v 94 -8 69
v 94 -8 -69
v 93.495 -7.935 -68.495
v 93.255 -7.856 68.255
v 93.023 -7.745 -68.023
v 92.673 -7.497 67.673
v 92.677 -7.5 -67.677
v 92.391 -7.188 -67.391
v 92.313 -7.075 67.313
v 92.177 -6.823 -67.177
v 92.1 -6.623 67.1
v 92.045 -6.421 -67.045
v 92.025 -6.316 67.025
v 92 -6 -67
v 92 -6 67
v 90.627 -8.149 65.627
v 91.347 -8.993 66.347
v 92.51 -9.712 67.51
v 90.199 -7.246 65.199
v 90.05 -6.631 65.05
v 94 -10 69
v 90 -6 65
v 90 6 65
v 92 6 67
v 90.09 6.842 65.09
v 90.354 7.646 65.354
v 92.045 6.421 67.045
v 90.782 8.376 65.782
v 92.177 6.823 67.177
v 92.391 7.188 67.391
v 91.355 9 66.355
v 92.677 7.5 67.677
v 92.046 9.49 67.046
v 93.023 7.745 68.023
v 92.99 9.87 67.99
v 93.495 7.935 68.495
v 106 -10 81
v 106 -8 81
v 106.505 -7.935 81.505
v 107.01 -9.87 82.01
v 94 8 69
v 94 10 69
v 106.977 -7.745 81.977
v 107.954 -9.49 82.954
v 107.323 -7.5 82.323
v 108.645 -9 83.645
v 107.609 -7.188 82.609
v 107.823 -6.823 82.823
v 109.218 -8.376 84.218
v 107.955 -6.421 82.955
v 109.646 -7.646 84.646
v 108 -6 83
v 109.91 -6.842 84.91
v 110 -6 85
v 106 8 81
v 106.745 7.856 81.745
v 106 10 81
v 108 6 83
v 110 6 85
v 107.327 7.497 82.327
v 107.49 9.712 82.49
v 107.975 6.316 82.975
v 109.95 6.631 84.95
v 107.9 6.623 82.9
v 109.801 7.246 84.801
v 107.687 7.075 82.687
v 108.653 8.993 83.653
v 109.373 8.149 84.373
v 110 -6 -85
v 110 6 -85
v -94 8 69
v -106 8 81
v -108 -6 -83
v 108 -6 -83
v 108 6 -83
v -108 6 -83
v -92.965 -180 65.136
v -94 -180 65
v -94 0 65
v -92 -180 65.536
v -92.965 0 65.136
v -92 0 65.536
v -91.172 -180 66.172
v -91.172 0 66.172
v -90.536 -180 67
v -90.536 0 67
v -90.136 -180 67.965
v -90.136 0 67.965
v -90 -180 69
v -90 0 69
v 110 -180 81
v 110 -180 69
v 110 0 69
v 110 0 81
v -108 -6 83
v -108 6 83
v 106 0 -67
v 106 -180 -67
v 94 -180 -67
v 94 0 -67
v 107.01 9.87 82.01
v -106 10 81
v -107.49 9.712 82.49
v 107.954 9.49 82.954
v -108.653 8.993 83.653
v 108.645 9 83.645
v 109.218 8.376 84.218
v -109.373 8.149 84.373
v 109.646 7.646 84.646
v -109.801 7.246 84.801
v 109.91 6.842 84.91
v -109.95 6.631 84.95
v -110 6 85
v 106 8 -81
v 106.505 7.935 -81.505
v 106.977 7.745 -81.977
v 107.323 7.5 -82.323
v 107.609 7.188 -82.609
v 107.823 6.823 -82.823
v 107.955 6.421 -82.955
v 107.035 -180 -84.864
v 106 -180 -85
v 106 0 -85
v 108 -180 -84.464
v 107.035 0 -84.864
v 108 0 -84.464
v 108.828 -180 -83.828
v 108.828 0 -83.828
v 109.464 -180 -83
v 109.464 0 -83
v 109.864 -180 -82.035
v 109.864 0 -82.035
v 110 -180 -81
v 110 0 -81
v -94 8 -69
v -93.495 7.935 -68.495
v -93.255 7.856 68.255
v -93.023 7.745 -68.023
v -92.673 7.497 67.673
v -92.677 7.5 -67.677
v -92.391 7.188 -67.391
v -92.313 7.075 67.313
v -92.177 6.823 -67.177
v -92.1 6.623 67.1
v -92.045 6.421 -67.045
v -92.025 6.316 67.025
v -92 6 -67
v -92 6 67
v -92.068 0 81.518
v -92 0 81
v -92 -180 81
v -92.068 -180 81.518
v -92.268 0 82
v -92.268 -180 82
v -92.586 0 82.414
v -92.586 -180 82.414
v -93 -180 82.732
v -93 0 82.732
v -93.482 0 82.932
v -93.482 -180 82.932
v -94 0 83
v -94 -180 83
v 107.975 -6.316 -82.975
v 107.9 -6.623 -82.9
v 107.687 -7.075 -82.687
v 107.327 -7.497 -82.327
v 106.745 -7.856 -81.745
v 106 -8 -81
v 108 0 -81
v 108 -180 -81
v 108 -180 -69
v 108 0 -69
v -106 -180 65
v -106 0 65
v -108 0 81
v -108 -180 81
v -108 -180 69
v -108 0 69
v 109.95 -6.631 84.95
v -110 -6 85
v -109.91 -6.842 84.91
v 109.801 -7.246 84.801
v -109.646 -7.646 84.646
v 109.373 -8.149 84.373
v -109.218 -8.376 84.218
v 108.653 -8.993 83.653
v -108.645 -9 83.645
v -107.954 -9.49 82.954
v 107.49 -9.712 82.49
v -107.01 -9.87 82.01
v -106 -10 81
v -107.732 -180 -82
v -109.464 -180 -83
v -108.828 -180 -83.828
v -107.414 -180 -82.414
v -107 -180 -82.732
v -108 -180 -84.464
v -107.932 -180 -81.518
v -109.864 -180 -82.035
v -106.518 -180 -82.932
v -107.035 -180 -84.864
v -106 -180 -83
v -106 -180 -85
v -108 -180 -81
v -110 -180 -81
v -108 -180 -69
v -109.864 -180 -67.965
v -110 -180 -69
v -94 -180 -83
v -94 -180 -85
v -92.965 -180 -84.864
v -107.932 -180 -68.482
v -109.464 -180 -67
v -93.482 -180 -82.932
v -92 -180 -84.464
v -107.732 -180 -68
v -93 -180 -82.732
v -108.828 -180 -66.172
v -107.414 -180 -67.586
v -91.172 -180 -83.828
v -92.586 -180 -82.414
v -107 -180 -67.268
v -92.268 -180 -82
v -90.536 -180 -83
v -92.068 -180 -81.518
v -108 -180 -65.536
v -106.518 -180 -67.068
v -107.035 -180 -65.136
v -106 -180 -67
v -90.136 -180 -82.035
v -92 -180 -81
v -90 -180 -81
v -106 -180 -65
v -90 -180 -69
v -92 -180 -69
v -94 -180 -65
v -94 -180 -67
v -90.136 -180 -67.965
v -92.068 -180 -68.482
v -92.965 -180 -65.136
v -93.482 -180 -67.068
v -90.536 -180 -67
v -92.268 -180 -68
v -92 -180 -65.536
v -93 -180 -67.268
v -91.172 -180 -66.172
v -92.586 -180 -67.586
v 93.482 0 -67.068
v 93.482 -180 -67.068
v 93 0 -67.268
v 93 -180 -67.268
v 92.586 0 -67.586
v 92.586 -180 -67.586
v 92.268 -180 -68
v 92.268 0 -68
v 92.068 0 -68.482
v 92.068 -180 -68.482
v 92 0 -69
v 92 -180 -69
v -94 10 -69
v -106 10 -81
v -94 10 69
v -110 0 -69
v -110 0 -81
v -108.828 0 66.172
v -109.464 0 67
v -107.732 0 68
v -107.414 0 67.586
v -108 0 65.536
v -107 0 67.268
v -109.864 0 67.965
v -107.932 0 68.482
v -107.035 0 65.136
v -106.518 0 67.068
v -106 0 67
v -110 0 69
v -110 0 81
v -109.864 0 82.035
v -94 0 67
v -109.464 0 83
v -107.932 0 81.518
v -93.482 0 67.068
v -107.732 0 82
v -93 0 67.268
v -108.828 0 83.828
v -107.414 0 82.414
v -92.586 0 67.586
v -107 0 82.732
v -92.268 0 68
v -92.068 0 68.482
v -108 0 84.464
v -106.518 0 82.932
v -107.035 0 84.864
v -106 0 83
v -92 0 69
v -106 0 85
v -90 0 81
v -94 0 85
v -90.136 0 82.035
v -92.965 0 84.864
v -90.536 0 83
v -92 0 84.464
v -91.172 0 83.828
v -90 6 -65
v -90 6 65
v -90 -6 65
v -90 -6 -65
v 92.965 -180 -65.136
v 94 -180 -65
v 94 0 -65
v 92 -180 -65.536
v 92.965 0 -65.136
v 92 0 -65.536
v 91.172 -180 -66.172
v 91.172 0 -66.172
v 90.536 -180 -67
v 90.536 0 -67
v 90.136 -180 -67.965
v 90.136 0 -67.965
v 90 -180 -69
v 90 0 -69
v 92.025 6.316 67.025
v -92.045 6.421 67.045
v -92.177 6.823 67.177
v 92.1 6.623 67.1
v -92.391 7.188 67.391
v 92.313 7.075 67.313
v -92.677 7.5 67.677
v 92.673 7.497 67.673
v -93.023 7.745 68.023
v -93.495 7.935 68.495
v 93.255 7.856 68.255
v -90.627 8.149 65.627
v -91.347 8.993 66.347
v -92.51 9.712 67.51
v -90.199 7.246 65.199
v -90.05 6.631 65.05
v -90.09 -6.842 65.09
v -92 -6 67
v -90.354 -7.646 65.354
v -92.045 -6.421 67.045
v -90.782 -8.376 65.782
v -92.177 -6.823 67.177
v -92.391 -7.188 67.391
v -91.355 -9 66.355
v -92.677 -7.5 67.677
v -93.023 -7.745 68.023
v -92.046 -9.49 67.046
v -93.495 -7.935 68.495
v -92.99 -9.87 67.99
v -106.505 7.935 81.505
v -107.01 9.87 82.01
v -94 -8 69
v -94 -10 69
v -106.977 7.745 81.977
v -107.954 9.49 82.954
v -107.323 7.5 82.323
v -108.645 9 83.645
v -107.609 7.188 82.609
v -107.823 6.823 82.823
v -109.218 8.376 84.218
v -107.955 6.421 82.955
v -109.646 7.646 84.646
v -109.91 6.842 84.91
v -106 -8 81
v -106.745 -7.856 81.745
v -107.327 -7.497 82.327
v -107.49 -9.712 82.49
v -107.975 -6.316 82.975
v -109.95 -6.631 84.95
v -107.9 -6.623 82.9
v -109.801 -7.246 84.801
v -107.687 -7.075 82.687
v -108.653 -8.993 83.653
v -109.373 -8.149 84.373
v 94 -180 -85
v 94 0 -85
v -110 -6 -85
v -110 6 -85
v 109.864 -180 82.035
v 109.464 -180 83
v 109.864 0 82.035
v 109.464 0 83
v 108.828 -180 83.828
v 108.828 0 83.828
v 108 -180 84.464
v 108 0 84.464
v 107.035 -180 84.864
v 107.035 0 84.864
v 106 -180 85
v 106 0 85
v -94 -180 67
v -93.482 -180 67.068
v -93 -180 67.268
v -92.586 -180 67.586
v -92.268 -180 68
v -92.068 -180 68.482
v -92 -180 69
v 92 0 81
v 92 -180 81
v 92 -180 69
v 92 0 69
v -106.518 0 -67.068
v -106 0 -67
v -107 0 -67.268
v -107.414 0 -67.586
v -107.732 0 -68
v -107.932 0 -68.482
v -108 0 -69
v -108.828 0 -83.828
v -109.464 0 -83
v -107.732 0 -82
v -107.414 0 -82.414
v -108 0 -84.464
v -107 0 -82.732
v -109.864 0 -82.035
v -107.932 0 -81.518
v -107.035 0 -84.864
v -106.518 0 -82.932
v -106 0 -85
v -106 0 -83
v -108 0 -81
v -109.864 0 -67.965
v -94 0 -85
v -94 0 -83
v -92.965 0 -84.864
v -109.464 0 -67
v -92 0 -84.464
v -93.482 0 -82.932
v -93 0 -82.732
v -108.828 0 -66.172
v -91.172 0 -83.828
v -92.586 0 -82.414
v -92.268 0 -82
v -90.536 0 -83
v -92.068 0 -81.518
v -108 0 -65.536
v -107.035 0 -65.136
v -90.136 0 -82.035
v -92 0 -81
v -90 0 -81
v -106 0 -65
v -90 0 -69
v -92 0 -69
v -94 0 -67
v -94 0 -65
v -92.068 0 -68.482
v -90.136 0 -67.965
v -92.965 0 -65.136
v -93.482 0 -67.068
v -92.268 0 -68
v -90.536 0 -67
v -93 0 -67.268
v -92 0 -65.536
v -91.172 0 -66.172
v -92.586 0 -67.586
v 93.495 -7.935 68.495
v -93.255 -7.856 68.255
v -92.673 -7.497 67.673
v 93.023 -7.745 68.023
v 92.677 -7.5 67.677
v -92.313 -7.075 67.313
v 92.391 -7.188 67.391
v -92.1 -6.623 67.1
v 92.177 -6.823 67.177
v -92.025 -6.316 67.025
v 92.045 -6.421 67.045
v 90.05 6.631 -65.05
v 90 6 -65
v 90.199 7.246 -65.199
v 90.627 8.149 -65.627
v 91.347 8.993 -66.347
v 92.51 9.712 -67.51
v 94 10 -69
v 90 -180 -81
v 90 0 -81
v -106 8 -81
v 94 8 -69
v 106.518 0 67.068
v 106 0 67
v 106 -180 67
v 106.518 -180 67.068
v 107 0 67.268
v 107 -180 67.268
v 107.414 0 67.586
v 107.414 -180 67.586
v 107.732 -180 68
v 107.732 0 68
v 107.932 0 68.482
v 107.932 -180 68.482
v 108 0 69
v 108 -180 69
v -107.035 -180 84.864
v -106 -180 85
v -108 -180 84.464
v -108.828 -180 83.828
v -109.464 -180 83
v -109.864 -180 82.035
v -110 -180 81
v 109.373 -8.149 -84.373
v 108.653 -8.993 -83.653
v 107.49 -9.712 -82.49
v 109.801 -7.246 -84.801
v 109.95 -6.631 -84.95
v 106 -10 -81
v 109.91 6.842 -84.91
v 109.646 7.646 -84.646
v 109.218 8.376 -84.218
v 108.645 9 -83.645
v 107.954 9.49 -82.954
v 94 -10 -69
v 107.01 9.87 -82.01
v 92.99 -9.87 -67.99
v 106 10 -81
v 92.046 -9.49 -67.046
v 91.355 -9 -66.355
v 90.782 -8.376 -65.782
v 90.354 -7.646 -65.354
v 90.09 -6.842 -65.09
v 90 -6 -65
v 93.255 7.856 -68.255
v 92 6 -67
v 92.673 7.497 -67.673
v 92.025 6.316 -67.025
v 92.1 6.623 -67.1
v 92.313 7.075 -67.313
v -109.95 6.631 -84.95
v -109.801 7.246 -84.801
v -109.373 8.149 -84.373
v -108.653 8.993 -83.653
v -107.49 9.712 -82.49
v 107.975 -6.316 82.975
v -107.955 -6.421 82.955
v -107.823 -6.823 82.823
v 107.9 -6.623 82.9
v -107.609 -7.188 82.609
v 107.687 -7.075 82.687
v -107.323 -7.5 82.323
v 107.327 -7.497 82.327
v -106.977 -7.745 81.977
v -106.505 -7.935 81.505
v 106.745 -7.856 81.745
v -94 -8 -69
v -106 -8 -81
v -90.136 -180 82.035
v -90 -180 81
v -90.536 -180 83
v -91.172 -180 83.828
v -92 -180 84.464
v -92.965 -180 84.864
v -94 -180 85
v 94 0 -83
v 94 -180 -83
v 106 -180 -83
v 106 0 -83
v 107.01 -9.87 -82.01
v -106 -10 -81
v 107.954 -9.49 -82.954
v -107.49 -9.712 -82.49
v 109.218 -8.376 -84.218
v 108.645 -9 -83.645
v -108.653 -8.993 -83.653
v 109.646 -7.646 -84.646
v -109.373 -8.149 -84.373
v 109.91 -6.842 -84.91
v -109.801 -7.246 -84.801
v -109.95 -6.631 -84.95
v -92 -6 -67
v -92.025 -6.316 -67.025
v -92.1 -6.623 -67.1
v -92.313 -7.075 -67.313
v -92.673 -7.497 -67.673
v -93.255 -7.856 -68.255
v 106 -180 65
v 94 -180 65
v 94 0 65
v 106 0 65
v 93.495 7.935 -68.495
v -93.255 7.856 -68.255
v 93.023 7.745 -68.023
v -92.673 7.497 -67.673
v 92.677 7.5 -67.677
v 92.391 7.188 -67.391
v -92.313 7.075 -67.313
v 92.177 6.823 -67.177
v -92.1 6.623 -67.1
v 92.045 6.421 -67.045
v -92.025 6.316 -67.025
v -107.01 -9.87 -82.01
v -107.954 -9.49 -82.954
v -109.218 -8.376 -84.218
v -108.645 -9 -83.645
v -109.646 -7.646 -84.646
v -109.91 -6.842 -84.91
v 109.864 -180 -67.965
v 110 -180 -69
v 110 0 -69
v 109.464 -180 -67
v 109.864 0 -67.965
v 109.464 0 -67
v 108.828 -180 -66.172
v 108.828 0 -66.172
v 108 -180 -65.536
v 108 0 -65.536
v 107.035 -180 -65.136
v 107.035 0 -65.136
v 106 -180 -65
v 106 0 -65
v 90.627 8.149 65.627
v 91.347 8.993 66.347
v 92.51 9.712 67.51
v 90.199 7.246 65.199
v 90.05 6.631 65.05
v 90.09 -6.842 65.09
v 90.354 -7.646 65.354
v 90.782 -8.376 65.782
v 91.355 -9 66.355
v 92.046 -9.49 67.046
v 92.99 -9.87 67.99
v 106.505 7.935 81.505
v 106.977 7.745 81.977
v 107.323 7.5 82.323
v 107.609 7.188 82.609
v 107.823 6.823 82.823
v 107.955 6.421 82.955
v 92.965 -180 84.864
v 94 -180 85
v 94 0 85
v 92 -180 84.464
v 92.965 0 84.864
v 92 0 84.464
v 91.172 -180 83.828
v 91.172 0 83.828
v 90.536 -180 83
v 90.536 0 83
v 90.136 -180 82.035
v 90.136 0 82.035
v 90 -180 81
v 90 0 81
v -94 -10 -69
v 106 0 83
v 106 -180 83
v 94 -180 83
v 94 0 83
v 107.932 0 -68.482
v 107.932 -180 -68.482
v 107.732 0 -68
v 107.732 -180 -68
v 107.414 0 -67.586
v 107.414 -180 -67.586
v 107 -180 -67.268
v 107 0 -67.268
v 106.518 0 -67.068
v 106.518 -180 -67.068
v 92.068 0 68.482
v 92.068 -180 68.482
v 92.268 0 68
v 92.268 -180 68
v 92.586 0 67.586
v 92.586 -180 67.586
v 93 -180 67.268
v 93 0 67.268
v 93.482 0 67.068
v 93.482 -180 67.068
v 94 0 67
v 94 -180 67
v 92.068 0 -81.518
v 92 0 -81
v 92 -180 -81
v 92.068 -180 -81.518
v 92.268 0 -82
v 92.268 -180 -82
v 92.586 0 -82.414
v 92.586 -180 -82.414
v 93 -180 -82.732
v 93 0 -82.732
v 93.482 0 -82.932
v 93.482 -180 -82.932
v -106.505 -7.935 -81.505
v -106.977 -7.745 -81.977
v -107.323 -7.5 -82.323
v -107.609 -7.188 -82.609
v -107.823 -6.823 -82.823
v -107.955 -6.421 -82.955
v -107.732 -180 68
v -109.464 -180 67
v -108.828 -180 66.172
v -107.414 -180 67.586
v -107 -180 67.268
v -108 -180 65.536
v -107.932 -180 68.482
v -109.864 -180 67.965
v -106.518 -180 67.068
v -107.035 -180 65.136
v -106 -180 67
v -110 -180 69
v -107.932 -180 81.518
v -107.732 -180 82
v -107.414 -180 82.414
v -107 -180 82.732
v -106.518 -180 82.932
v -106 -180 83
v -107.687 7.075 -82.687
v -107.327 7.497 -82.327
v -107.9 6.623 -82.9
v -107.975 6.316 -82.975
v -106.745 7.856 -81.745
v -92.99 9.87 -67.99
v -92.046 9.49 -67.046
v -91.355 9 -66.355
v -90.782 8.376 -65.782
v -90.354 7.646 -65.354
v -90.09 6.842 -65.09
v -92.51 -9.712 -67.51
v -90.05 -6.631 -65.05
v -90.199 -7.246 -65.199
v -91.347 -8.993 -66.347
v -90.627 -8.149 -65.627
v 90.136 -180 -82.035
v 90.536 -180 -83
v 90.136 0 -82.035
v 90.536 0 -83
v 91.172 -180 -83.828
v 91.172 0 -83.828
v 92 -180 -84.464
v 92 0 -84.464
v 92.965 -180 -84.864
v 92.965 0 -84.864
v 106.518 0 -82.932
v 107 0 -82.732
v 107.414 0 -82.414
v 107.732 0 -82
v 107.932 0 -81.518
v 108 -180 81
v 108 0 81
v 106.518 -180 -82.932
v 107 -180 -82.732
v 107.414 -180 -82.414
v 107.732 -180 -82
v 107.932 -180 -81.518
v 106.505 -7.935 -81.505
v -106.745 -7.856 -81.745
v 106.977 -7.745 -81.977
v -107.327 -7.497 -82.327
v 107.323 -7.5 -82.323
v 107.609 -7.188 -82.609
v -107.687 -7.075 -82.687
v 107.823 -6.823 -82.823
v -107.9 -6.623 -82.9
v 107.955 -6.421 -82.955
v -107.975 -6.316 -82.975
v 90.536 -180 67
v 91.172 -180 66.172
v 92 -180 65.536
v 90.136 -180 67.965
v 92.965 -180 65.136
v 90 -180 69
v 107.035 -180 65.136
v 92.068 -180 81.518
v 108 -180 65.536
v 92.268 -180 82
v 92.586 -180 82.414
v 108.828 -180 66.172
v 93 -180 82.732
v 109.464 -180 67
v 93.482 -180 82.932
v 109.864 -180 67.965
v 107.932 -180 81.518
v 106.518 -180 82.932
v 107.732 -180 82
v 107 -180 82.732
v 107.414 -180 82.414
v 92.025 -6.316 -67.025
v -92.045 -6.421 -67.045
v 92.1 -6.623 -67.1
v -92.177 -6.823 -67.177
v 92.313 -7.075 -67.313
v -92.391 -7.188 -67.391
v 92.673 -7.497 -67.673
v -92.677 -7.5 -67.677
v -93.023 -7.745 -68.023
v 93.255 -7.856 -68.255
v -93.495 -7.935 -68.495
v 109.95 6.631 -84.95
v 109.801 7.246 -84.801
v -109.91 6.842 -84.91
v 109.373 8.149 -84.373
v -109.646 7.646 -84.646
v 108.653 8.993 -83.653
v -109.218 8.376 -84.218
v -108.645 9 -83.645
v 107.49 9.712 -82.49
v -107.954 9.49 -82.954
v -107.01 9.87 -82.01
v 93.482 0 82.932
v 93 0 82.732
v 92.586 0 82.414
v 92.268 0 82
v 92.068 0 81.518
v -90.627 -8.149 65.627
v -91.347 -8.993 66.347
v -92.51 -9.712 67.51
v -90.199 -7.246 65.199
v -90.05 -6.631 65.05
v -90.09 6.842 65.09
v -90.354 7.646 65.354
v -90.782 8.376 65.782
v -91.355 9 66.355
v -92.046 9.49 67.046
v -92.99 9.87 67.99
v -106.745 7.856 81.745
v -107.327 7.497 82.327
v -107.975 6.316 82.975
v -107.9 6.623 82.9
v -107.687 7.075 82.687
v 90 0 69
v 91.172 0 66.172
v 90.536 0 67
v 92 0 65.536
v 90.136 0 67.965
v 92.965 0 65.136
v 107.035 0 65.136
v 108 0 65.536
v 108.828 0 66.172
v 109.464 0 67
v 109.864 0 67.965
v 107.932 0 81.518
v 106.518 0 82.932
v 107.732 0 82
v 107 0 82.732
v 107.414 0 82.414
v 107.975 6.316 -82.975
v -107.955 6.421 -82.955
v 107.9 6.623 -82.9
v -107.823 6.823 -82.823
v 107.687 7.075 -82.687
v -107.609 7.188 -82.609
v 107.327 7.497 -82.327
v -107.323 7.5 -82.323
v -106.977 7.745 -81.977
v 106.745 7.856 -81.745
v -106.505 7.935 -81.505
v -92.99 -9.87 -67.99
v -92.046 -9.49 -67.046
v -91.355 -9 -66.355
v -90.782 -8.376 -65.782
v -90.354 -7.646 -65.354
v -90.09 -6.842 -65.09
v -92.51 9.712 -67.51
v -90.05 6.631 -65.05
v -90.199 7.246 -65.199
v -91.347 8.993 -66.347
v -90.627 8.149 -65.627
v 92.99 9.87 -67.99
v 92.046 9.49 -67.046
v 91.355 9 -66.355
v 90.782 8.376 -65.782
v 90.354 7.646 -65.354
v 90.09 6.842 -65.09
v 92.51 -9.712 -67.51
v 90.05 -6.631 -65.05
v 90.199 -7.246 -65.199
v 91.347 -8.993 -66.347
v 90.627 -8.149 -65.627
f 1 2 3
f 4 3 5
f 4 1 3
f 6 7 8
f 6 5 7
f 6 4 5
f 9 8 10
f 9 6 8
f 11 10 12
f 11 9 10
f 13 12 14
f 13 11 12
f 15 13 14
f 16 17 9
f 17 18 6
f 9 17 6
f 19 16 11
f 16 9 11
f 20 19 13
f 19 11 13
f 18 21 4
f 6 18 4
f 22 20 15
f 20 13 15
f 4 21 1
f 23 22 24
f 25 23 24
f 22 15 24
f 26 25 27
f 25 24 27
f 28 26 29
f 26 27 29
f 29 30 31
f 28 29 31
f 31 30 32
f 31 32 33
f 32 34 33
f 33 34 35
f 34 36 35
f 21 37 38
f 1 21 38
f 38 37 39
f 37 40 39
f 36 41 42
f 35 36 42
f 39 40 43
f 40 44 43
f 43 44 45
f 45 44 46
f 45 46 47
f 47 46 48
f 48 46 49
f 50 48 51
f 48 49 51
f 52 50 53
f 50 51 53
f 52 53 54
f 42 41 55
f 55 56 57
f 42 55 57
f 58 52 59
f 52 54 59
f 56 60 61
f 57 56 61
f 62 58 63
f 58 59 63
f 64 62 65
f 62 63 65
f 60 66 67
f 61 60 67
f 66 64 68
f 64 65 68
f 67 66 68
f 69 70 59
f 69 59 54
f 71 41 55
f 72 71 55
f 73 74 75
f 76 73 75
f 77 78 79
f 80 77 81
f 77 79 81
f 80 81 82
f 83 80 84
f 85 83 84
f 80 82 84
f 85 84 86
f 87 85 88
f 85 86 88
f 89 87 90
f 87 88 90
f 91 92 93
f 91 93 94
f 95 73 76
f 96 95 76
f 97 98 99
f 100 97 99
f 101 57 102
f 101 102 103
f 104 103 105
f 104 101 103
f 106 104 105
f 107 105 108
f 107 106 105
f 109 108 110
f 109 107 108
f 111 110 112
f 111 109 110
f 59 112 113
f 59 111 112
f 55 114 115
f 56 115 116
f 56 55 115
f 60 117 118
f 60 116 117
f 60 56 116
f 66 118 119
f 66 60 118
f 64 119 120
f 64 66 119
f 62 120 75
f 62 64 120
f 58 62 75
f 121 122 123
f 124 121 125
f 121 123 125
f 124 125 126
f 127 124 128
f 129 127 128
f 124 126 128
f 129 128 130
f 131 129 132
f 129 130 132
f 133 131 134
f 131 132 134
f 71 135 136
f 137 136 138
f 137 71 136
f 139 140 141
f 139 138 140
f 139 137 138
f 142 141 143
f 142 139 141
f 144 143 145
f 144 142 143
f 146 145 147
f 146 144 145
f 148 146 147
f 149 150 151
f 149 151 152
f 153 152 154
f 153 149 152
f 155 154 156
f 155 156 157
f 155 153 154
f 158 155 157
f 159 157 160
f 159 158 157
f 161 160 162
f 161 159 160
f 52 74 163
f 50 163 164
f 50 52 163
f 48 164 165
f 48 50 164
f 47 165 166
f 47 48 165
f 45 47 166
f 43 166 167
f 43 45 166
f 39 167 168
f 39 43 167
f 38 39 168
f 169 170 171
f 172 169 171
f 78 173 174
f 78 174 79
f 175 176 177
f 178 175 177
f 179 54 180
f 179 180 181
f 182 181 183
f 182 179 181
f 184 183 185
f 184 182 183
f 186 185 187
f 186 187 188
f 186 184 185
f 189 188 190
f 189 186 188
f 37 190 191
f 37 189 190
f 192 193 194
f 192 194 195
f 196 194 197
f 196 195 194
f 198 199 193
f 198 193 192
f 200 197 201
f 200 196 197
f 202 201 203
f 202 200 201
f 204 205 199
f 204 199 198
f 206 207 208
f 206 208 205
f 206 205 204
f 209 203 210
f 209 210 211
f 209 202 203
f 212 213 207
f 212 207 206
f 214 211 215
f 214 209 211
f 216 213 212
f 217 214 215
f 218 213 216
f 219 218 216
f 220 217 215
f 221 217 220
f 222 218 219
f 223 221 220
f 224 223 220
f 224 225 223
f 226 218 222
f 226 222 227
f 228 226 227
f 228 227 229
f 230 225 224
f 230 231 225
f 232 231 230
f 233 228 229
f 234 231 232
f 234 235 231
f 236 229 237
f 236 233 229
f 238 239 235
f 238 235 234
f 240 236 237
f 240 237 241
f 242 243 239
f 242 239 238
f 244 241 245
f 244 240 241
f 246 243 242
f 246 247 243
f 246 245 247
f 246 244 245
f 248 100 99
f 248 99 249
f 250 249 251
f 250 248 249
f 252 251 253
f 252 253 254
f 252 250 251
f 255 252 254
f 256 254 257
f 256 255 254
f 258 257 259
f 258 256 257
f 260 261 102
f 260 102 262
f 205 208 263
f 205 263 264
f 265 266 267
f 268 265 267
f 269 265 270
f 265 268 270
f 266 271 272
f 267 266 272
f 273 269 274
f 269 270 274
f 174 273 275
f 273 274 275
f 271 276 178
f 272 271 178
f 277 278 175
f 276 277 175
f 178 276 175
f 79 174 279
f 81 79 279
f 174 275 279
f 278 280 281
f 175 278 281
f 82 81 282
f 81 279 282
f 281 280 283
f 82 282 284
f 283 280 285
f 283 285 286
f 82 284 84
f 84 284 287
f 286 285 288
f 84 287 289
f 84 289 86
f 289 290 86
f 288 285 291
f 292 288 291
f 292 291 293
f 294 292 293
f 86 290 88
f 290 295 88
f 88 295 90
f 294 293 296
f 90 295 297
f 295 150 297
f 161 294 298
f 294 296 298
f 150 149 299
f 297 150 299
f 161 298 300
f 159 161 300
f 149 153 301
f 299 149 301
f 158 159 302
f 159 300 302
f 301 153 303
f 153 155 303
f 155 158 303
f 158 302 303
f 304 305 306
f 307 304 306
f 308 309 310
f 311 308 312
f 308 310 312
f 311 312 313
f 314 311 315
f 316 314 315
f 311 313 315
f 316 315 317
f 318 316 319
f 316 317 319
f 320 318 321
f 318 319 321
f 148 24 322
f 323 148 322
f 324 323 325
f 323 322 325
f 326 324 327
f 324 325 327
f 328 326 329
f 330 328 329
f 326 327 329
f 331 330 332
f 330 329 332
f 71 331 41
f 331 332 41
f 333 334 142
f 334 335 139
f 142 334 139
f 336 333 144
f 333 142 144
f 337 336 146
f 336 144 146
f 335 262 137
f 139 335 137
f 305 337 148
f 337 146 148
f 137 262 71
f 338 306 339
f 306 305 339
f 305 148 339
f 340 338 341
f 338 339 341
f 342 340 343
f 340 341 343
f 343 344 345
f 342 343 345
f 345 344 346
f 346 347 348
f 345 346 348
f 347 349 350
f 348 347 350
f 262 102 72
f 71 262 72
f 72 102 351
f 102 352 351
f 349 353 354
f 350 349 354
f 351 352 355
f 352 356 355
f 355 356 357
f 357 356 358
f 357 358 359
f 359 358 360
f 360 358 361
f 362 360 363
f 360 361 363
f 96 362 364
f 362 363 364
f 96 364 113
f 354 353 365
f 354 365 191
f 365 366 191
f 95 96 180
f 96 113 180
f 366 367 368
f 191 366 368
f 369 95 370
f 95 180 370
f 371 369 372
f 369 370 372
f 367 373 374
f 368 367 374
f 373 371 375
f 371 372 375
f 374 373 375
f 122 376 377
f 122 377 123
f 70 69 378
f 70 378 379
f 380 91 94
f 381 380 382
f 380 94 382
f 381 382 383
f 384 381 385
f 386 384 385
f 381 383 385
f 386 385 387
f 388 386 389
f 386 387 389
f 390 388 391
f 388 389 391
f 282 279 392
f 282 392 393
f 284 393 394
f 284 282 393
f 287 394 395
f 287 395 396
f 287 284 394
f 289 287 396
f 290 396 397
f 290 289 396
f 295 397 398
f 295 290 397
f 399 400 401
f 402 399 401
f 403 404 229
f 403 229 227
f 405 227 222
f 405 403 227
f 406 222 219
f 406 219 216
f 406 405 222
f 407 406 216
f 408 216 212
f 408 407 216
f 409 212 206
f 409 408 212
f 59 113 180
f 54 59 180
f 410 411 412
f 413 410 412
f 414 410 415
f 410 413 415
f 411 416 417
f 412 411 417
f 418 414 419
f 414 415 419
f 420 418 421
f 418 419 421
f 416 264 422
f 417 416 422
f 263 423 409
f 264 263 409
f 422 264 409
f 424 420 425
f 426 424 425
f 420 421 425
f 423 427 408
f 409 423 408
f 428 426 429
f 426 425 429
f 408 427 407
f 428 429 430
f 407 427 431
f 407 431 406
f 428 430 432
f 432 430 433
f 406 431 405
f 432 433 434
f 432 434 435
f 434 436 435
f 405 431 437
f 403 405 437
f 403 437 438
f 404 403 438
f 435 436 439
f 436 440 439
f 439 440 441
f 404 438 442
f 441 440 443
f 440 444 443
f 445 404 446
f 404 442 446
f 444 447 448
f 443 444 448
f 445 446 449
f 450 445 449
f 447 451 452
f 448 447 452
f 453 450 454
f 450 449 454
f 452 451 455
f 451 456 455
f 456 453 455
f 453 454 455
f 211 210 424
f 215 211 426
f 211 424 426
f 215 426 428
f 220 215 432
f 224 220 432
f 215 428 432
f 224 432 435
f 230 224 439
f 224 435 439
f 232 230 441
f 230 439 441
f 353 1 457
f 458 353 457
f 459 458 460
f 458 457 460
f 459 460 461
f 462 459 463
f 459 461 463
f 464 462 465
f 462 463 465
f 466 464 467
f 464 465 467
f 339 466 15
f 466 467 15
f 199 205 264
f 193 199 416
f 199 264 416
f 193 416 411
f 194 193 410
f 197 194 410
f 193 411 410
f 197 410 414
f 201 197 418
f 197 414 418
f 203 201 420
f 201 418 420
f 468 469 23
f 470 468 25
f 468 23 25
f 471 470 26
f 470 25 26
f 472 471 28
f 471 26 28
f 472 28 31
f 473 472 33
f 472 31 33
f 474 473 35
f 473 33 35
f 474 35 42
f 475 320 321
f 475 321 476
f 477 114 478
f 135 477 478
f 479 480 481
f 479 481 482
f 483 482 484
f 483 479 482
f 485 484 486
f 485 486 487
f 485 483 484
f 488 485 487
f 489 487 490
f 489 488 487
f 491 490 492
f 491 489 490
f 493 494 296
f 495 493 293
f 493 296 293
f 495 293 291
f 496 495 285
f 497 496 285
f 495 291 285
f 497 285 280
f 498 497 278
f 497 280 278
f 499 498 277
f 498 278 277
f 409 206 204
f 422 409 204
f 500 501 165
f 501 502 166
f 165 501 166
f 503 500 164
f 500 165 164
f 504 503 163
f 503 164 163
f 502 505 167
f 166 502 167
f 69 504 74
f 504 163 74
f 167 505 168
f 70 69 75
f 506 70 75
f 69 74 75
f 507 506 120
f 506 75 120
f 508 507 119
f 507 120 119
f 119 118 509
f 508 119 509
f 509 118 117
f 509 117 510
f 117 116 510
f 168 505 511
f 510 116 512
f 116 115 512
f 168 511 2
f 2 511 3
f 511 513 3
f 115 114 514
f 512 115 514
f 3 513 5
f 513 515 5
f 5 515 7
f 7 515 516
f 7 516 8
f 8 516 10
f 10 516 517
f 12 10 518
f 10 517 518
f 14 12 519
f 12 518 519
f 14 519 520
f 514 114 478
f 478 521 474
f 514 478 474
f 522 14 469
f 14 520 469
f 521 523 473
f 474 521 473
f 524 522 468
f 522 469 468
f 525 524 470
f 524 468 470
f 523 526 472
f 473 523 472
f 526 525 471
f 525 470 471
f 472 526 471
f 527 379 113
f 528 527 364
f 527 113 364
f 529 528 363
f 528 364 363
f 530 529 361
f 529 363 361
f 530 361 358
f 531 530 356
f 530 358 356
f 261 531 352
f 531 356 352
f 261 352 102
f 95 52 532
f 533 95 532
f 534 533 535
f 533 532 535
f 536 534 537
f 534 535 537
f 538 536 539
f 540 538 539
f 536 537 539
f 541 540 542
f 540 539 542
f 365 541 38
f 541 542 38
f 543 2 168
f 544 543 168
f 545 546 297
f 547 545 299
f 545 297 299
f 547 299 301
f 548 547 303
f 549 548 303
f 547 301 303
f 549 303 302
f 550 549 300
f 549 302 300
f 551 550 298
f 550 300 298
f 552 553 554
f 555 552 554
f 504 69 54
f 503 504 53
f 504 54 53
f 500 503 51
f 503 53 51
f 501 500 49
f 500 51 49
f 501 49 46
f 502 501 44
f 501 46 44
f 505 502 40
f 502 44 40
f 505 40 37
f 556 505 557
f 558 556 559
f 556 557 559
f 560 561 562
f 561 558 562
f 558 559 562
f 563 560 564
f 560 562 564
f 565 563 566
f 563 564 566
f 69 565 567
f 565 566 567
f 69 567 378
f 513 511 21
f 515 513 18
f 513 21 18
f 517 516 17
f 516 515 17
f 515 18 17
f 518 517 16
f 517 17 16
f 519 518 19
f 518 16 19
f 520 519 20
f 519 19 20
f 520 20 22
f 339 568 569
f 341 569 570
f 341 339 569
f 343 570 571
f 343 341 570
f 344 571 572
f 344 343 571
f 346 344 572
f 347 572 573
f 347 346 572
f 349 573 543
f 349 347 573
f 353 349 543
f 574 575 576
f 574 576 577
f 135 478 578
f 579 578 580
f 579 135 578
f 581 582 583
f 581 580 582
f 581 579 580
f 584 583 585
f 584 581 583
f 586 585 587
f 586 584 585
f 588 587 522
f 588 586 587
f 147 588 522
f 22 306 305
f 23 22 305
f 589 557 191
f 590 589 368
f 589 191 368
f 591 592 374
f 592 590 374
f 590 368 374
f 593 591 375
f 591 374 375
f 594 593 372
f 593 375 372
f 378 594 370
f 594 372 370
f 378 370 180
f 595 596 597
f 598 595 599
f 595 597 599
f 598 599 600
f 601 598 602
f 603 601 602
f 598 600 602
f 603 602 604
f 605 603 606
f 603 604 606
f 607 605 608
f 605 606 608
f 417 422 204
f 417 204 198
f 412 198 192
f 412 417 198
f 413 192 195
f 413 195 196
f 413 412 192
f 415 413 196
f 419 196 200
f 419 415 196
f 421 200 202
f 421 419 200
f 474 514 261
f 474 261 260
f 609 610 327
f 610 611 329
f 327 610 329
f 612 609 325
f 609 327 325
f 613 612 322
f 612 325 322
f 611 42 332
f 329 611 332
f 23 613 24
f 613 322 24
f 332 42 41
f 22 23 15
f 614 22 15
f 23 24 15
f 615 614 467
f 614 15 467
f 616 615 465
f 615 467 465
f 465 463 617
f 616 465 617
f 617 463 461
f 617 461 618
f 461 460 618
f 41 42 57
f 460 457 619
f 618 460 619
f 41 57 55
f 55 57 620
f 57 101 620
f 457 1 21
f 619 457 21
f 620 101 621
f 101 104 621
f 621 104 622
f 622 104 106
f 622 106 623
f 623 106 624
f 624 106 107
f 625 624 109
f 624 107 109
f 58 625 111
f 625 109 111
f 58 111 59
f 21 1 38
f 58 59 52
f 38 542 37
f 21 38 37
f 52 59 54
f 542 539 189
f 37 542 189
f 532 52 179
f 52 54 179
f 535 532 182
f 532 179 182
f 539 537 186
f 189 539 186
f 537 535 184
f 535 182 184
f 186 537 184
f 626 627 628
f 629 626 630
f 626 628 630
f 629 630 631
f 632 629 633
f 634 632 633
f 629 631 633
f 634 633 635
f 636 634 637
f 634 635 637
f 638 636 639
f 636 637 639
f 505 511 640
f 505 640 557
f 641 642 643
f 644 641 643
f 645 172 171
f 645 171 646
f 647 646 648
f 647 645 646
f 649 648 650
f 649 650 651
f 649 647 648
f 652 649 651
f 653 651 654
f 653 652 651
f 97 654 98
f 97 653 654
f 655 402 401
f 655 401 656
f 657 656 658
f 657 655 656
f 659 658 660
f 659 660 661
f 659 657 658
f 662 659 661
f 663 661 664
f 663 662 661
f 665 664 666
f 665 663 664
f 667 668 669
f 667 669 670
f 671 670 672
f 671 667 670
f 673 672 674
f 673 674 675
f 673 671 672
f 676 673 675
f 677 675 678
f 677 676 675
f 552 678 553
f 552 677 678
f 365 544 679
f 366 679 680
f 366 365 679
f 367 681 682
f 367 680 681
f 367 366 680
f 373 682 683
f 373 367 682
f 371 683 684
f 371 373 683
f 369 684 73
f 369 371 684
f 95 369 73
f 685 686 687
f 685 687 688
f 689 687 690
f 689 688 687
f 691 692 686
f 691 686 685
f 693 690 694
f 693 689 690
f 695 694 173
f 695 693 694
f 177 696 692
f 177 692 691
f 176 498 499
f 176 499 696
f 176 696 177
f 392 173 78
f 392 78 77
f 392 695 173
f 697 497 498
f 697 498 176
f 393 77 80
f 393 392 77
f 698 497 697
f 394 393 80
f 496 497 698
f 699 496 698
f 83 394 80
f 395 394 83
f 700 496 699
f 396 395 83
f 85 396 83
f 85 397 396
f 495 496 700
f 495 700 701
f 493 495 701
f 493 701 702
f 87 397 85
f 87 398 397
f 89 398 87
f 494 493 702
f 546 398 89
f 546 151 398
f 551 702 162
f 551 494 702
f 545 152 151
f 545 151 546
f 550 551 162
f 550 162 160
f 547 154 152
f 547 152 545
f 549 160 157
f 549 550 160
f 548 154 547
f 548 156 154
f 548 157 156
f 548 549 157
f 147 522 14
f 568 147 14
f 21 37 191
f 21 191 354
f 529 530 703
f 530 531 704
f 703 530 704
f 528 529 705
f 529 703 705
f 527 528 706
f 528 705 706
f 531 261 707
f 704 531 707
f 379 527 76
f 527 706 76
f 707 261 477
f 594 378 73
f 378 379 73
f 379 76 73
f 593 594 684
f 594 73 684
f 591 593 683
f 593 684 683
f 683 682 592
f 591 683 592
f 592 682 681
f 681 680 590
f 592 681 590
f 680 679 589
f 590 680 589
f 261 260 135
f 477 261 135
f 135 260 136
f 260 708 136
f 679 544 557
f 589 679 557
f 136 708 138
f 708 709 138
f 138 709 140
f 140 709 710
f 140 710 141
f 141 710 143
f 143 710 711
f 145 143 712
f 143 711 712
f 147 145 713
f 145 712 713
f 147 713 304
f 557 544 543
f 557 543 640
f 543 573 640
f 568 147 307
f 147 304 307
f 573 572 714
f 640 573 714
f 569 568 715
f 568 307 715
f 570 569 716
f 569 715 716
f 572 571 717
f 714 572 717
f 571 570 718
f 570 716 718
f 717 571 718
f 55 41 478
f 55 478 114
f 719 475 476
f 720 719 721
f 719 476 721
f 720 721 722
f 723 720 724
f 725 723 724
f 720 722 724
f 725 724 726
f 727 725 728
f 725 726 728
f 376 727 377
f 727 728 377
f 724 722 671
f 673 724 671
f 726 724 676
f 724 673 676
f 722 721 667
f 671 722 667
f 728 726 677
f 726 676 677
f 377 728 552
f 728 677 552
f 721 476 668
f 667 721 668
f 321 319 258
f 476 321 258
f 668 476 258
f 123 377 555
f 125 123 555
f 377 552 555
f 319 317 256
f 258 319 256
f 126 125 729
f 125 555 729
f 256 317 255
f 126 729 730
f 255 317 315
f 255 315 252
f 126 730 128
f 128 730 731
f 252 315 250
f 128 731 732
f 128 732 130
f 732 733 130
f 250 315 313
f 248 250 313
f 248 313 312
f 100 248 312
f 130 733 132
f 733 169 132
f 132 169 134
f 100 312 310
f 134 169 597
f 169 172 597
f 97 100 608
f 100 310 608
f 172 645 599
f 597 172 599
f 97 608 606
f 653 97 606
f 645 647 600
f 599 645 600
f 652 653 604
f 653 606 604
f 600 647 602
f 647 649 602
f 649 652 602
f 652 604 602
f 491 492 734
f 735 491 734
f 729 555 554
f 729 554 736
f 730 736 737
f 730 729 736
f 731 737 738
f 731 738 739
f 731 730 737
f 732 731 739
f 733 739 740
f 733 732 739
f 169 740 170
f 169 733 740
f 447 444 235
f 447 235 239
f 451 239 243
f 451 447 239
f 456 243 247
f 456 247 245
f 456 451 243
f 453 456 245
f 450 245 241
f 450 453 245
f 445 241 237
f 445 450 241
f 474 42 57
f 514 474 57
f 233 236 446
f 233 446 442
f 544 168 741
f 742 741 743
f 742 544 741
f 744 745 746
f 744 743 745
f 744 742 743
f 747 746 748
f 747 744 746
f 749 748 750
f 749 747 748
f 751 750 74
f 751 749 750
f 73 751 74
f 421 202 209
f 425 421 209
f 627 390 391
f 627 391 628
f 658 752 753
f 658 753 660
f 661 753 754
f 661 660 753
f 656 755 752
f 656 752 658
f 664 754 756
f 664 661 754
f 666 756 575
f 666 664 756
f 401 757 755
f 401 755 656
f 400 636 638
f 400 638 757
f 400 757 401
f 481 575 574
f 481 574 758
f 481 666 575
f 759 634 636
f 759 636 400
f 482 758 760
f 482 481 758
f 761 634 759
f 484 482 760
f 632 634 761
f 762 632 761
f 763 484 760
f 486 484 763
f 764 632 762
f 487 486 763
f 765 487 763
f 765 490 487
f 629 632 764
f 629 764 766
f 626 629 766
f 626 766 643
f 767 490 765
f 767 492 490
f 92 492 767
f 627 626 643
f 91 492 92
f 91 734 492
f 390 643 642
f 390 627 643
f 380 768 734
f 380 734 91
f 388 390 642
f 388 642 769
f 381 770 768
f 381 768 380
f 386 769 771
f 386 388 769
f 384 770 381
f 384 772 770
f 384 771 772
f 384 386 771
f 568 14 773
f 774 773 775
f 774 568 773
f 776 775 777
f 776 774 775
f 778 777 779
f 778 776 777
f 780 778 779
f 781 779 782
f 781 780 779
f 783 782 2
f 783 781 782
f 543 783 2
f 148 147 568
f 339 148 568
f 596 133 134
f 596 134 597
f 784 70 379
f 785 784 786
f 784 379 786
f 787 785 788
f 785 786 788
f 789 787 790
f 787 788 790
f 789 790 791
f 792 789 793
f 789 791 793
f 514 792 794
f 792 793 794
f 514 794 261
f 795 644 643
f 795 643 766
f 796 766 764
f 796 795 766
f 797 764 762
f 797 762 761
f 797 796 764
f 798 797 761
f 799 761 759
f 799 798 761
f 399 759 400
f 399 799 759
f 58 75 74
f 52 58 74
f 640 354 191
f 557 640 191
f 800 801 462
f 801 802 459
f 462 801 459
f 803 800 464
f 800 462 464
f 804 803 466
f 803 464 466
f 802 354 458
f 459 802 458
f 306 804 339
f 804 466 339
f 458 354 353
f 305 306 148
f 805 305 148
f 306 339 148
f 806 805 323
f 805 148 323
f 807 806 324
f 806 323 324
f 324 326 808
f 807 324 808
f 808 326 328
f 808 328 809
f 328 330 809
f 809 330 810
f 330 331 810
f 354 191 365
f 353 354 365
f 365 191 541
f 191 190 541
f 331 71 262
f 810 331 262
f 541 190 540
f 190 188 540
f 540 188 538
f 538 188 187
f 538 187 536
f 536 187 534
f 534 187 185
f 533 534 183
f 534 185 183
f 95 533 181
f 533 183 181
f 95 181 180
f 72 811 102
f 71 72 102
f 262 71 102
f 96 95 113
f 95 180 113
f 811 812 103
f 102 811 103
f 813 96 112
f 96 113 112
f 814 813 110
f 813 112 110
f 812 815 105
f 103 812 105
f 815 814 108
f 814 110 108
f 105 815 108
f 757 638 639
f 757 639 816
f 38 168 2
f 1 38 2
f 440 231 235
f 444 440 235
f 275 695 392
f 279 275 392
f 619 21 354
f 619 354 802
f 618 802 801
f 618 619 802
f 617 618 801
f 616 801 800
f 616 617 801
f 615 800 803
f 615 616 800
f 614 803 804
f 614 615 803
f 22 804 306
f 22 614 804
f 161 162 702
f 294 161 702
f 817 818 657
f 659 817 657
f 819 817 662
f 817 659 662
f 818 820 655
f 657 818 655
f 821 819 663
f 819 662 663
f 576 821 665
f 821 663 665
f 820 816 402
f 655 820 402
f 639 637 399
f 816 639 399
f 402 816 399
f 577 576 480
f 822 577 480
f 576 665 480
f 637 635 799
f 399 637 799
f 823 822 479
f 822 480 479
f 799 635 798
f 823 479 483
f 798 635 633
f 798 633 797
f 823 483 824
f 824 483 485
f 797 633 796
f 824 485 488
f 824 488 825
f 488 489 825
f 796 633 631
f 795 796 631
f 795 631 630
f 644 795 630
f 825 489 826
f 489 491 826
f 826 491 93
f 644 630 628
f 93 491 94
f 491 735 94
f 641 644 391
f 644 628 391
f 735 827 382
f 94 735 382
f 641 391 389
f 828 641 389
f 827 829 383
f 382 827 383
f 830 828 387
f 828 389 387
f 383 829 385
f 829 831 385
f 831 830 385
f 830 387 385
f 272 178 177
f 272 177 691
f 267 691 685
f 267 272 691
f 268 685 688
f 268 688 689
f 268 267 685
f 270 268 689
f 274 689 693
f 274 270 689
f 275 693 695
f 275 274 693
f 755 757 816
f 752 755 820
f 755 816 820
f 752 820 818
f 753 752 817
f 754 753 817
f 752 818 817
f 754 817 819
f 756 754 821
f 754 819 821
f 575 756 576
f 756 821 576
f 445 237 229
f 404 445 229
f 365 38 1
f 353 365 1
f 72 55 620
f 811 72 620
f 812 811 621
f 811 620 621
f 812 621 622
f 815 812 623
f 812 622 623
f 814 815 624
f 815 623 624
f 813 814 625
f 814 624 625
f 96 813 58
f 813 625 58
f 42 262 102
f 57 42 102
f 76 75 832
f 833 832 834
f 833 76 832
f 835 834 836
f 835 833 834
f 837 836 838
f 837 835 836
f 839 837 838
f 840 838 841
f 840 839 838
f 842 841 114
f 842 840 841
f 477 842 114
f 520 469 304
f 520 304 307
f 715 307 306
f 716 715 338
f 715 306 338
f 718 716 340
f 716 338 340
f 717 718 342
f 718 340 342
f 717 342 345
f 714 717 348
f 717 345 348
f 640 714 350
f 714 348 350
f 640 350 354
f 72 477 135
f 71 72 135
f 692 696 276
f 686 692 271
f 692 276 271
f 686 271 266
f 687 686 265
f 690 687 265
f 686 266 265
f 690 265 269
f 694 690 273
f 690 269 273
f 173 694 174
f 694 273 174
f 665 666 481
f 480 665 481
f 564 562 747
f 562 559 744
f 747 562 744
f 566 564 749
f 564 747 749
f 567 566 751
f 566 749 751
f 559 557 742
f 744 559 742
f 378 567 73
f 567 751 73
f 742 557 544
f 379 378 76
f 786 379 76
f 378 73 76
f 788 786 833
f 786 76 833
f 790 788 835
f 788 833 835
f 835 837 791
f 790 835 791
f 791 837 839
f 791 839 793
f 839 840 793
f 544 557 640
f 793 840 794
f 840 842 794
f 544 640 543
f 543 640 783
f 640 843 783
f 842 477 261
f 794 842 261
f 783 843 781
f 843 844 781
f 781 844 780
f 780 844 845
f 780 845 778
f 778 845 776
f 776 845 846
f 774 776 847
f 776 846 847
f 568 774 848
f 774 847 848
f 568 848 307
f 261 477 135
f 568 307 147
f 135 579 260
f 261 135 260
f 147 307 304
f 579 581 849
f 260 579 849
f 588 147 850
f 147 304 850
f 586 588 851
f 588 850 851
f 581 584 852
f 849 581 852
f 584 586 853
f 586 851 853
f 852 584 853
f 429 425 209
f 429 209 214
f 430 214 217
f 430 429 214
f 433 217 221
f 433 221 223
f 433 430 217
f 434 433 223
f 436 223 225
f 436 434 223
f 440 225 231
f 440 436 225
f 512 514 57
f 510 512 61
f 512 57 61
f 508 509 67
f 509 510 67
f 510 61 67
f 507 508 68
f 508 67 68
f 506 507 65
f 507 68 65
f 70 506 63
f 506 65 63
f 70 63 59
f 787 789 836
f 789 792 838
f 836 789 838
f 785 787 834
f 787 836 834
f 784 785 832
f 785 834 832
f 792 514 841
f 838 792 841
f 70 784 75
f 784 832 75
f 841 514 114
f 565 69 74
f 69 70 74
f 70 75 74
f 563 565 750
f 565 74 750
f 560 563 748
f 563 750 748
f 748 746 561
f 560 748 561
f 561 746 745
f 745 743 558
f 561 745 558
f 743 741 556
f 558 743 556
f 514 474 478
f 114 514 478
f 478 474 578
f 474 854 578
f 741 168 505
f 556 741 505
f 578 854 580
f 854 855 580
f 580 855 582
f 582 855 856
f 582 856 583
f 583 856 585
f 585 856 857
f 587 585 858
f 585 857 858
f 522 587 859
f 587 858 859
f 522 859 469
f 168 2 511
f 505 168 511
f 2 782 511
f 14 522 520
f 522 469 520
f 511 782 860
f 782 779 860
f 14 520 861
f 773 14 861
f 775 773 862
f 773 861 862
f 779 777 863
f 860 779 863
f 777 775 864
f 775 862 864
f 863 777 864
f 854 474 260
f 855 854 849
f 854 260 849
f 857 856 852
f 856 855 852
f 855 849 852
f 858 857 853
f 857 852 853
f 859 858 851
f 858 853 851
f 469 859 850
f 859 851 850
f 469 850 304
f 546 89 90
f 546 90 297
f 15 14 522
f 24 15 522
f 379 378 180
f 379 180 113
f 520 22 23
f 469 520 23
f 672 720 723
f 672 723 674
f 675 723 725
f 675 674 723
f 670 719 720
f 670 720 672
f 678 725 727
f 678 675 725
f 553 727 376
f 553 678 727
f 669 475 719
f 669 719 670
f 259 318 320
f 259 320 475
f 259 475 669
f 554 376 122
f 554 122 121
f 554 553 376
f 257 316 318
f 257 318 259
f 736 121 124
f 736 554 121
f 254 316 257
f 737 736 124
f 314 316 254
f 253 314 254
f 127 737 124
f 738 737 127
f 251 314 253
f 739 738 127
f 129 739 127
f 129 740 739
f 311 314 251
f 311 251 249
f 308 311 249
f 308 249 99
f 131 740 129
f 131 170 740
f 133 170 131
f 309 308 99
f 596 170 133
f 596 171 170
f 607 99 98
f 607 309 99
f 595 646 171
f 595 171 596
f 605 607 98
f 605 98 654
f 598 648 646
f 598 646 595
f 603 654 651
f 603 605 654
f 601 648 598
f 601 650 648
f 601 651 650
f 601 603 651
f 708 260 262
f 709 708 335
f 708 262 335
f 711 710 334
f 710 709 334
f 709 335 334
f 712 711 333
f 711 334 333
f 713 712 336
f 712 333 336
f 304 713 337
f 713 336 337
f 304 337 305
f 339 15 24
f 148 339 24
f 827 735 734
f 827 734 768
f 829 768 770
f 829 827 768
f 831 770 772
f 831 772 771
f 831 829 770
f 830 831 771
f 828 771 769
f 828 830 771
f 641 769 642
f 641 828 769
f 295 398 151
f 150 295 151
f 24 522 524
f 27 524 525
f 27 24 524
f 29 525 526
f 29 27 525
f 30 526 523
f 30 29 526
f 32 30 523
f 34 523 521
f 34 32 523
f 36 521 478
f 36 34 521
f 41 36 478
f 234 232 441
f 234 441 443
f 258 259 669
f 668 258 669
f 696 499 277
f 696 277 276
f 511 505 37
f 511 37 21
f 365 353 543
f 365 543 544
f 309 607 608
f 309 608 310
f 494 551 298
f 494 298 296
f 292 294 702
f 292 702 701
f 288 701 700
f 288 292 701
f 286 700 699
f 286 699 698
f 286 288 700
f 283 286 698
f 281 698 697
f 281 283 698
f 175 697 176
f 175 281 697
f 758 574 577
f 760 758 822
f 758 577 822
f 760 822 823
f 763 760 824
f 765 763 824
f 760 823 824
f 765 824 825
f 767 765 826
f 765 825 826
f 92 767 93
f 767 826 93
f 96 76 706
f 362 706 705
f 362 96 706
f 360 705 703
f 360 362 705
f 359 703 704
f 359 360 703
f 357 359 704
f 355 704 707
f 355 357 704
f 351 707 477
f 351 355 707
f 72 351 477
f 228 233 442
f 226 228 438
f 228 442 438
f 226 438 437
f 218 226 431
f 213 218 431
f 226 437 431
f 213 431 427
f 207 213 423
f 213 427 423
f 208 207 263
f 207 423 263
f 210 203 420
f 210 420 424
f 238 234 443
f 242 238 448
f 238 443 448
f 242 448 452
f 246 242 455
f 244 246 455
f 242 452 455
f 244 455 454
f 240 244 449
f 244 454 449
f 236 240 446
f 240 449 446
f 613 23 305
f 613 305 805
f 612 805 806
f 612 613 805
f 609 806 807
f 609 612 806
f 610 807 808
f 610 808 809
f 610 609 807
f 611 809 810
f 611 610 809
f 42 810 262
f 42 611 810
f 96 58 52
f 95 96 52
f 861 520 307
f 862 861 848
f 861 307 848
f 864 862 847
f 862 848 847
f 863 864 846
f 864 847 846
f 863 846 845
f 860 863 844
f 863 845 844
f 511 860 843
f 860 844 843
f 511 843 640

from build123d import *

# Parameters (mm, degrees)
STRUCTURAL_MEMBER1_DEPTH      = 215.142135624
STRUCTURAL_MEMBER1_DEPTH_BACK = 15.142135624
STRUCTURAL_MEMBER1_2_DEPTH    = 180.284271247
STRUCTURAL_MEMBER1_3_DEPTH    = 230.284271247
STRUCTURAL_MEMBER1_4_DEPTH    = 180.284271247
STRUCTURAL_MEMBER2_DEPTH      = 180
STRUCTURAL_MEMBER2_2_DEPTH    = 180
STRUCTURAL_MEMBER2_3_DEPTH    = 180
STRUCTURAL_MEMBER2_4_DEPTH    = 180


with BuildPart() as part:
    # Sketch1 → Structural Member1 (new body, two sides)
    with BuildSketch(Plane(origin=(-100, 0, 75), x_dir=(0, 0, -1), z_dir=(1, 0, 0))) as structural_member1_sk:
        with BuildLine():
            Line((-6, -10), (6, -10))
            ThreePointArc((6, -10), (8.828427125, -8.828427125), (10, -6))
            Line((10, -6), (10, 6))
            ThreePointArc((10, 6), (8.828427125, 8.828427125), (6, 10))
            Line((6, 10), (-6, 10))
            ThreePointArc((-6, 10), (-8.828427125, 8.828427125), (-10, 6))
            Line((-10, 6), (-10, -6))
            ThreePointArc((-10, -6), (-8.828427125, -8.828427125), (-6, -10))
        make_face()
        with BuildLine():
            Line((-6, -8), (6, -8))
            ThreePointArc((6, -8), (7.414213562, -7.414213562), (8, -6))
            Line((8, -6), (8, 6))
            ThreePointArc((8, 6), (7.414213562, 7.414213562), (6, 8))
            Line((6, 8), (-6, 8))
            ThreePointArc((-6, 8), (-7.414213562, 7.414213562), (-8, 6))
            Line((-8, 6), (-8, -6))
            ThreePointArc((-8, -6), (-7.414213562, -7.414213562), (-6, -8))
        make_face(mode=Mode.SUBTRACT)
    extrude(amount=STRUCTURAL_MEMBER1_DEPTH)
    extrude(structural_member1_sk.sketch, amount=-STRUCTURAL_MEMBER1_DEPTH_BACK)

    # Structural Member1 mitre 1
    split(bisect_by=Plane(origin=(-100, 0, 75), x_dir=(0, 1, 0), z_dir=(0.707106781, 0, 0.707106781)), keep=Keep.TOP)

    # Structural Member1 mitre 2
    split(bisect_by=Plane(origin=(100, 0, 75), x_dir=(0, -1, 0), z_dir=(-0.707106781, 0, 0.707106781)), keep=Keep.TOP)


with BuildPart() as body_2:
    # Sketch1 on segment 2 (carried to segment 2) → Structural Member1 2 (new body)
    with BuildSketch(Plane(origin=(100, 0, 90.142135624), x_dir=(-1, 0, 0), z_dir=(0, 0, -1))):
        with BuildLine():
            Line((-6, -10), (6, -10))
            ThreePointArc((6, -10), (8.828427125, -8.828427125), (10, -6))
            Line((10, -6), (10, 6))
            ThreePointArc((10, 6), (8.828427125, 8.828427125), (6, 10))
            Line((6, 10), (-6, 10))
            ThreePointArc((-6, 10), (-8.828427125, 8.828427125), (-10, 6))
            Line((-10, 6), (-10, -6))
            ThreePointArc((-10, -6), (-8.828427125, -8.828427125), (-6, -10))
        make_face()
        with BuildLine():
            Line((-6, -8), (6, -8))
            ThreePointArc((6, -8), (7.414213562, -7.414213562), (8, -6))
            Line((8, -6), (8, 6))
            ThreePointArc((8, 6), (7.414213562, 7.414213562), (6, 8))
            Line((6, 8), (-6, 8))
            ThreePointArc((-6, 8), (-7.414213562, 7.414213562), (-8, 6))
            Line((-8, 6), (-8, -6))
            ThreePointArc((-8, -6), (-7.414213562, -7.414213562), (-6, -8))
        make_face(mode=Mode.SUBTRACT)
    extrude(amount=STRUCTURAL_MEMBER1_2_DEPTH)

    # Structural Member1 2 mitre 1
    split(bisect_by=Plane(origin=(100, 0, 75), x_dir=(0, 1, 0), z_dir=(0.707106781, 0, -0.707106781)), keep=Keep.TOP)

    # Structural Member1 2 mitre 2
    split(bisect_by=Plane(origin=(100, 0, -75), x_dir=(0, 1, 0), z_dir=(0.707106781, 0, 0.707106781)), keep=Keep.TOP)


with BuildPart() as body_3:
    # Sketch1 on segment 3 (carried to segment 3) → Structural Member1 3 (new body)
    with BuildSketch(Plane(origin=(-115.142135624, 0, -75), x_dir=(0, 0, -1), z_dir=(1, 0, 0))):
        with BuildLine():
            Line((-6, -10), (6, -10))
            ThreePointArc((6, -10), (8.828427125, -8.828427125), (10, -6))
            Line((10, -6), (10, 6))
            ThreePointArc((10, 6), (8.828427125, 8.828427125), (6, 10))
            Line((6, 10), (-6, 10))
            ThreePointArc((-6, 10), (-8.828427125, 8.828427125), (-10, 6))
            Line((-10, 6), (-10, -6))
            ThreePointArc((-10, -6), (-8.828427125, -8.828427125), (-6, -10))
        make_face()
        with BuildLine():
            Line((-6, -8), (6, -8))
            ThreePointArc((6, -8), (7.414213562, -7.414213562), (8, -6))
            Line((8, -6), (8, 6))
            ThreePointArc((8, 6), (7.414213562, 7.414213562), (6, 8))
            Line((6, 8), (-6, 8))
            ThreePointArc((-6, 8), (-7.414213562, 7.414213562), (-8, 6))
            Line((-8, 6), (-8, -6))
            ThreePointArc((-8, -6), (-7.414213562, -7.414213562), (-6, -8))
        make_face(mode=Mode.SUBTRACT)
    extrude(amount=STRUCTURAL_MEMBER1_3_DEPTH)

    # Structural Member1 3 mitre 1
    split(bisect_by=Plane(origin=(-100, 0, -75), x_dir=(0, 1, 0), z_dir=(0.707106781, 0, -0.707106781)), keep=Keep.TOP)

    # Structural Member1 3 mitre 2
    split(bisect_by=Plane(origin=(100, 0, -75), x_dir=(0, -1, 0), z_dir=(-0.707106781, 0, -0.707106781)), keep=Keep.TOP)


with BuildPart() as body_4:
    # Sketch1 on segment 4 (carried to segment 4) → Structural Member1 4 (new body)
    with BuildSketch(Plane(origin=(-100, 0, 90.142135624), x_dir=(-1, 0, 0), z_dir=(0, 0, -1))):
        with BuildLine():
            Line((-6, -10), (6, -10))
            ThreePointArc((6, -10), (8.828427125, -8.828427125), (10, -6))
            Line((10, -6), (10, 6))
            ThreePointArc((10, 6), (8.828427125, 8.828427125), (6, 10))
            Line((6, 10), (-6, 10))
            ThreePointArc((-6, 10), (-8.828427125, 8.828427125), (-10, 6))
            Line((-10, 6), (-10, -6))
            ThreePointArc((-10, -6), (-8.828427125, -8.828427125), (-6, -10))
        make_face()
        with BuildLine():
            Line((-6, -8), (6, -8))
            ThreePointArc((6, -8), (7.414213562, -7.414213562), (8, -6))
            Line((8, -6), (8, 6))
            ThreePointArc((8, 6), (7.414213562, 7.414213562), (6, 8))
            Line((6, 8), (-6, 8))
            ThreePointArc((-6, 8), (-7.414213562, 7.414213562), (-8, 6))
            Line((-8, 6), (-8, -6))
            ThreePointArc((-8, -6), (-7.414213562, -7.414213562), (-6, -8))
        make_face(mode=Mode.SUBTRACT)
    extrude(amount=STRUCTURAL_MEMBER1_4_DEPTH)

    # Structural Member1 4 mitre 1
    split(bisect_by=Plane(origin=(-100, 0, 75), x_dir=(0, -1, 0), z_dir=(-0.707106781, 0, -0.707106781)), keep=Keep.TOP)

    # Structural Member1 4 mitre 2
    split(bisect_by=Plane(origin=(-100, 0, -75), x_dir=(0, -1, 0), z_dir=(-0.707106781, 0, 0.707106781)), keep=Keep.TOP)


with BuildPart() as body_5:
    # Sketch17 → Structural Member2 (new body)
    with BuildSketch(Plane(origin=(-100, 0, 75), x_dir=(1, 0, 0), z_dir=(0, -1, 0))):
        with BuildLine():
            Line((-6, -10), (6, -10))
            ThreePointArc((6, -10), (8.828427125, -8.828427125), (10, -6))
            Line((10, -6), (10, 6))
            ThreePointArc((10, 6), (8.828427125, 8.828427125), (6, 10))
            Line((6, 10), (-6, 10))
            ThreePointArc((-6, 10), (-8.828427125, 8.828427125), (-10, 6))
            Line((-10, 6), (-10, -6))
            ThreePointArc((-10, -6), (-8.828427125, -8.828427125), (-6, -10))
        make_face()
        with BuildLine():
            Line((-6, -8), (6, -8))
            ThreePointArc((6, -8), (7.414213562, -7.414213562), (8, -6))
            Line((8, -6), (8, 6))
            ThreePointArc((8, 6), (7.414213562, 7.414213562), (6, 8))
            Line((6, 8), (-6, 8))
            ThreePointArc((-6, 8), (-7.414213562, 7.414213562), (-8, 6))
            Line((-8, 6), (-8, -6))
            ThreePointArc((-8, -6), (-7.414213562, -7.414213562), (-6, -8))
        make_face(mode=Mode.SUBTRACT)
    extrude(amount=STRUCTURAL_MEMBER2_DEPTH)


with BuildPart() as body_6:
    # Sketch17 on segment 2 (carried to segment 2) → Structural Member2 2 (new body)
    with BuildSketch(Plane(origin=(100, 0, 75), x_dir=(1, 0, 0), z_dir=(0, -1, 0))):
        with BuildLine():
            Line((-6, -10), (6, -10))
            ThreePointArc((6, -10), (8.828427125, -8.828427125), (10, -6))
            Line((10, -6), (10, 6))
            ThreePointArc((10, 6), (8.828427125, 8.828427125), (6, 10))
            Line((6, 10), (-6, 10))
            ThreePointArc((-6, 10), (-8.828427125, 8.828427125), (-10, 6))
            Line((-10, 6), (-10, -6))
            ThreePointArc((-10, -6), (-8.828427125, -8.828427125), (-6, -10))
        make_face()
        with BuildLine():
            Line((-6, -8), (6, -8))
            ThreePointArc((6, -8), (7.414213562, -7.414213562), (8, -6))
            Line((8, -6), (8, 6))
            ThreePointArc((8, 6), (7.414213562, 7.414213562), (6, 8))
            Line((6, 8), (-6, 8))
            ThreePointArc((-6, 8), (-7.414213562, 7.414213562), (-8, 6))
            Line((-8, 6), (-8, -6))
            ThreePointArc((-8, -6), (-7.414213562, -7.414213562), (-6, -8))
        make_face(mode=Mode.SUBTRACT)
    extrude(amount=STRUCTURAL_MEMBER2_2_DEPTH)


with BuildPart() as body_7:
    # Sketch17 on segment 3 (carried to segment 3) → Structural Member2 3 (new body)
    with BuildSketch(Plane(origin=(-100, 0, -75), x_dir=(1, 0, 0), z_dir=(0, -1, 0))):
        with BuildLine():
            Line((-6, -10), (6, -10))
            ThreePointArc((6, -10), (8.828427125, -8.828427125), (10, -6))
            Line((10, -6), (10, 6))
            ThreePointArc((10, 6), (8.828427125, 8.828427125), (6, 10))
            Line((6, 10), (-6, 10))
            ThreePointArc((-6, 10), (-8.828427125, 8.828427125), (-10, 6))
            Line((-10, 6), (-10, -6))
            ThreePointArc((-10, -6), (-8.828427125, -8.828427125), (-6, -10))
        make_face()
        with BuildLine():
            Line((-6, -8), (6, -8))
            ThreePointArc((6, -8), (7.414213562, -7.414213562), (8, -6))
            Line((8, -6), (8, 6))
            ThreePointArc((8, 6), (7.414213562, 7.414213562), (6, 8))
            Line((6, 8), (-6, 8))
            ThreePointArc((-6, 8), (-7.414213562, 7.414213562), (-8, 6))
            Line((-8, 6), (-8, -6))
            ThreePointArc((-8, -6), (-7.414213562, -7.414213562), (-6, -8))
        make_face(mode=Mode.SUBTRACT)
    extrude(amount=STRUCTURAL_MEMBER2_3_DEPTH)


with BuildPart() as body_8:
    # Sketch17 on segment 4 (carried to segment 4) → Structural Member2 4 (new body)
    with BuildSketch(Plane(origin=(100, 0, -75), x_dir=(1, 0, 0), z_dir=(0, -1, 0))):
        with BuildLine():
            Line((-6, -10), (6, -10))
            ThreePointArc((6, -10), (8.828427125, -8.828427125), (10, -6))
            Line((10, -6), (10, 6))
            ThreePointArc((10, 6), (8.828427125, 8.828427125), (6, 10))
            Line((6, 10), (-6, 10))
            ThreePointArc((-6, 10), (-8.828427125, 8.828427125), (-10, 6))
            Line((-10, 6), (-10, -6))
            ThreePointArc((-10, -6), (-8.828427125, -8.828427125), (-6, -10))
        make_face()
        with BuildLine():
            Line((-6, -8), (6, -8))
            ThreePointArc((6, -8), (7.414213562, -7.414213562), (8, -6))
            Line((8, -6), (8, 6))
            ThreePointArc((8, 6), (7.414213562, 7.414213562), (6, 8))
            Line((6, 8), (-6, 8))
            ThreePointArc((-6, 8), (-7.414213562, 7.414213562), (-8, 6))
            Line((-8, 6), (-8, -6))
            ThreePointArc((-8, -6), (-7.414213562, -7.414213562), (-6, -8))
        make_face(mode=Mode.SUBTRACT)
    extrude(amount=STRUCTURAL_MEMBER2_4_DEPTH)


solid = Compound([part.part, body_2.part, body_3.part, body_4.part, body_5.part, body_6.part, body_7.part, body_8.part])
